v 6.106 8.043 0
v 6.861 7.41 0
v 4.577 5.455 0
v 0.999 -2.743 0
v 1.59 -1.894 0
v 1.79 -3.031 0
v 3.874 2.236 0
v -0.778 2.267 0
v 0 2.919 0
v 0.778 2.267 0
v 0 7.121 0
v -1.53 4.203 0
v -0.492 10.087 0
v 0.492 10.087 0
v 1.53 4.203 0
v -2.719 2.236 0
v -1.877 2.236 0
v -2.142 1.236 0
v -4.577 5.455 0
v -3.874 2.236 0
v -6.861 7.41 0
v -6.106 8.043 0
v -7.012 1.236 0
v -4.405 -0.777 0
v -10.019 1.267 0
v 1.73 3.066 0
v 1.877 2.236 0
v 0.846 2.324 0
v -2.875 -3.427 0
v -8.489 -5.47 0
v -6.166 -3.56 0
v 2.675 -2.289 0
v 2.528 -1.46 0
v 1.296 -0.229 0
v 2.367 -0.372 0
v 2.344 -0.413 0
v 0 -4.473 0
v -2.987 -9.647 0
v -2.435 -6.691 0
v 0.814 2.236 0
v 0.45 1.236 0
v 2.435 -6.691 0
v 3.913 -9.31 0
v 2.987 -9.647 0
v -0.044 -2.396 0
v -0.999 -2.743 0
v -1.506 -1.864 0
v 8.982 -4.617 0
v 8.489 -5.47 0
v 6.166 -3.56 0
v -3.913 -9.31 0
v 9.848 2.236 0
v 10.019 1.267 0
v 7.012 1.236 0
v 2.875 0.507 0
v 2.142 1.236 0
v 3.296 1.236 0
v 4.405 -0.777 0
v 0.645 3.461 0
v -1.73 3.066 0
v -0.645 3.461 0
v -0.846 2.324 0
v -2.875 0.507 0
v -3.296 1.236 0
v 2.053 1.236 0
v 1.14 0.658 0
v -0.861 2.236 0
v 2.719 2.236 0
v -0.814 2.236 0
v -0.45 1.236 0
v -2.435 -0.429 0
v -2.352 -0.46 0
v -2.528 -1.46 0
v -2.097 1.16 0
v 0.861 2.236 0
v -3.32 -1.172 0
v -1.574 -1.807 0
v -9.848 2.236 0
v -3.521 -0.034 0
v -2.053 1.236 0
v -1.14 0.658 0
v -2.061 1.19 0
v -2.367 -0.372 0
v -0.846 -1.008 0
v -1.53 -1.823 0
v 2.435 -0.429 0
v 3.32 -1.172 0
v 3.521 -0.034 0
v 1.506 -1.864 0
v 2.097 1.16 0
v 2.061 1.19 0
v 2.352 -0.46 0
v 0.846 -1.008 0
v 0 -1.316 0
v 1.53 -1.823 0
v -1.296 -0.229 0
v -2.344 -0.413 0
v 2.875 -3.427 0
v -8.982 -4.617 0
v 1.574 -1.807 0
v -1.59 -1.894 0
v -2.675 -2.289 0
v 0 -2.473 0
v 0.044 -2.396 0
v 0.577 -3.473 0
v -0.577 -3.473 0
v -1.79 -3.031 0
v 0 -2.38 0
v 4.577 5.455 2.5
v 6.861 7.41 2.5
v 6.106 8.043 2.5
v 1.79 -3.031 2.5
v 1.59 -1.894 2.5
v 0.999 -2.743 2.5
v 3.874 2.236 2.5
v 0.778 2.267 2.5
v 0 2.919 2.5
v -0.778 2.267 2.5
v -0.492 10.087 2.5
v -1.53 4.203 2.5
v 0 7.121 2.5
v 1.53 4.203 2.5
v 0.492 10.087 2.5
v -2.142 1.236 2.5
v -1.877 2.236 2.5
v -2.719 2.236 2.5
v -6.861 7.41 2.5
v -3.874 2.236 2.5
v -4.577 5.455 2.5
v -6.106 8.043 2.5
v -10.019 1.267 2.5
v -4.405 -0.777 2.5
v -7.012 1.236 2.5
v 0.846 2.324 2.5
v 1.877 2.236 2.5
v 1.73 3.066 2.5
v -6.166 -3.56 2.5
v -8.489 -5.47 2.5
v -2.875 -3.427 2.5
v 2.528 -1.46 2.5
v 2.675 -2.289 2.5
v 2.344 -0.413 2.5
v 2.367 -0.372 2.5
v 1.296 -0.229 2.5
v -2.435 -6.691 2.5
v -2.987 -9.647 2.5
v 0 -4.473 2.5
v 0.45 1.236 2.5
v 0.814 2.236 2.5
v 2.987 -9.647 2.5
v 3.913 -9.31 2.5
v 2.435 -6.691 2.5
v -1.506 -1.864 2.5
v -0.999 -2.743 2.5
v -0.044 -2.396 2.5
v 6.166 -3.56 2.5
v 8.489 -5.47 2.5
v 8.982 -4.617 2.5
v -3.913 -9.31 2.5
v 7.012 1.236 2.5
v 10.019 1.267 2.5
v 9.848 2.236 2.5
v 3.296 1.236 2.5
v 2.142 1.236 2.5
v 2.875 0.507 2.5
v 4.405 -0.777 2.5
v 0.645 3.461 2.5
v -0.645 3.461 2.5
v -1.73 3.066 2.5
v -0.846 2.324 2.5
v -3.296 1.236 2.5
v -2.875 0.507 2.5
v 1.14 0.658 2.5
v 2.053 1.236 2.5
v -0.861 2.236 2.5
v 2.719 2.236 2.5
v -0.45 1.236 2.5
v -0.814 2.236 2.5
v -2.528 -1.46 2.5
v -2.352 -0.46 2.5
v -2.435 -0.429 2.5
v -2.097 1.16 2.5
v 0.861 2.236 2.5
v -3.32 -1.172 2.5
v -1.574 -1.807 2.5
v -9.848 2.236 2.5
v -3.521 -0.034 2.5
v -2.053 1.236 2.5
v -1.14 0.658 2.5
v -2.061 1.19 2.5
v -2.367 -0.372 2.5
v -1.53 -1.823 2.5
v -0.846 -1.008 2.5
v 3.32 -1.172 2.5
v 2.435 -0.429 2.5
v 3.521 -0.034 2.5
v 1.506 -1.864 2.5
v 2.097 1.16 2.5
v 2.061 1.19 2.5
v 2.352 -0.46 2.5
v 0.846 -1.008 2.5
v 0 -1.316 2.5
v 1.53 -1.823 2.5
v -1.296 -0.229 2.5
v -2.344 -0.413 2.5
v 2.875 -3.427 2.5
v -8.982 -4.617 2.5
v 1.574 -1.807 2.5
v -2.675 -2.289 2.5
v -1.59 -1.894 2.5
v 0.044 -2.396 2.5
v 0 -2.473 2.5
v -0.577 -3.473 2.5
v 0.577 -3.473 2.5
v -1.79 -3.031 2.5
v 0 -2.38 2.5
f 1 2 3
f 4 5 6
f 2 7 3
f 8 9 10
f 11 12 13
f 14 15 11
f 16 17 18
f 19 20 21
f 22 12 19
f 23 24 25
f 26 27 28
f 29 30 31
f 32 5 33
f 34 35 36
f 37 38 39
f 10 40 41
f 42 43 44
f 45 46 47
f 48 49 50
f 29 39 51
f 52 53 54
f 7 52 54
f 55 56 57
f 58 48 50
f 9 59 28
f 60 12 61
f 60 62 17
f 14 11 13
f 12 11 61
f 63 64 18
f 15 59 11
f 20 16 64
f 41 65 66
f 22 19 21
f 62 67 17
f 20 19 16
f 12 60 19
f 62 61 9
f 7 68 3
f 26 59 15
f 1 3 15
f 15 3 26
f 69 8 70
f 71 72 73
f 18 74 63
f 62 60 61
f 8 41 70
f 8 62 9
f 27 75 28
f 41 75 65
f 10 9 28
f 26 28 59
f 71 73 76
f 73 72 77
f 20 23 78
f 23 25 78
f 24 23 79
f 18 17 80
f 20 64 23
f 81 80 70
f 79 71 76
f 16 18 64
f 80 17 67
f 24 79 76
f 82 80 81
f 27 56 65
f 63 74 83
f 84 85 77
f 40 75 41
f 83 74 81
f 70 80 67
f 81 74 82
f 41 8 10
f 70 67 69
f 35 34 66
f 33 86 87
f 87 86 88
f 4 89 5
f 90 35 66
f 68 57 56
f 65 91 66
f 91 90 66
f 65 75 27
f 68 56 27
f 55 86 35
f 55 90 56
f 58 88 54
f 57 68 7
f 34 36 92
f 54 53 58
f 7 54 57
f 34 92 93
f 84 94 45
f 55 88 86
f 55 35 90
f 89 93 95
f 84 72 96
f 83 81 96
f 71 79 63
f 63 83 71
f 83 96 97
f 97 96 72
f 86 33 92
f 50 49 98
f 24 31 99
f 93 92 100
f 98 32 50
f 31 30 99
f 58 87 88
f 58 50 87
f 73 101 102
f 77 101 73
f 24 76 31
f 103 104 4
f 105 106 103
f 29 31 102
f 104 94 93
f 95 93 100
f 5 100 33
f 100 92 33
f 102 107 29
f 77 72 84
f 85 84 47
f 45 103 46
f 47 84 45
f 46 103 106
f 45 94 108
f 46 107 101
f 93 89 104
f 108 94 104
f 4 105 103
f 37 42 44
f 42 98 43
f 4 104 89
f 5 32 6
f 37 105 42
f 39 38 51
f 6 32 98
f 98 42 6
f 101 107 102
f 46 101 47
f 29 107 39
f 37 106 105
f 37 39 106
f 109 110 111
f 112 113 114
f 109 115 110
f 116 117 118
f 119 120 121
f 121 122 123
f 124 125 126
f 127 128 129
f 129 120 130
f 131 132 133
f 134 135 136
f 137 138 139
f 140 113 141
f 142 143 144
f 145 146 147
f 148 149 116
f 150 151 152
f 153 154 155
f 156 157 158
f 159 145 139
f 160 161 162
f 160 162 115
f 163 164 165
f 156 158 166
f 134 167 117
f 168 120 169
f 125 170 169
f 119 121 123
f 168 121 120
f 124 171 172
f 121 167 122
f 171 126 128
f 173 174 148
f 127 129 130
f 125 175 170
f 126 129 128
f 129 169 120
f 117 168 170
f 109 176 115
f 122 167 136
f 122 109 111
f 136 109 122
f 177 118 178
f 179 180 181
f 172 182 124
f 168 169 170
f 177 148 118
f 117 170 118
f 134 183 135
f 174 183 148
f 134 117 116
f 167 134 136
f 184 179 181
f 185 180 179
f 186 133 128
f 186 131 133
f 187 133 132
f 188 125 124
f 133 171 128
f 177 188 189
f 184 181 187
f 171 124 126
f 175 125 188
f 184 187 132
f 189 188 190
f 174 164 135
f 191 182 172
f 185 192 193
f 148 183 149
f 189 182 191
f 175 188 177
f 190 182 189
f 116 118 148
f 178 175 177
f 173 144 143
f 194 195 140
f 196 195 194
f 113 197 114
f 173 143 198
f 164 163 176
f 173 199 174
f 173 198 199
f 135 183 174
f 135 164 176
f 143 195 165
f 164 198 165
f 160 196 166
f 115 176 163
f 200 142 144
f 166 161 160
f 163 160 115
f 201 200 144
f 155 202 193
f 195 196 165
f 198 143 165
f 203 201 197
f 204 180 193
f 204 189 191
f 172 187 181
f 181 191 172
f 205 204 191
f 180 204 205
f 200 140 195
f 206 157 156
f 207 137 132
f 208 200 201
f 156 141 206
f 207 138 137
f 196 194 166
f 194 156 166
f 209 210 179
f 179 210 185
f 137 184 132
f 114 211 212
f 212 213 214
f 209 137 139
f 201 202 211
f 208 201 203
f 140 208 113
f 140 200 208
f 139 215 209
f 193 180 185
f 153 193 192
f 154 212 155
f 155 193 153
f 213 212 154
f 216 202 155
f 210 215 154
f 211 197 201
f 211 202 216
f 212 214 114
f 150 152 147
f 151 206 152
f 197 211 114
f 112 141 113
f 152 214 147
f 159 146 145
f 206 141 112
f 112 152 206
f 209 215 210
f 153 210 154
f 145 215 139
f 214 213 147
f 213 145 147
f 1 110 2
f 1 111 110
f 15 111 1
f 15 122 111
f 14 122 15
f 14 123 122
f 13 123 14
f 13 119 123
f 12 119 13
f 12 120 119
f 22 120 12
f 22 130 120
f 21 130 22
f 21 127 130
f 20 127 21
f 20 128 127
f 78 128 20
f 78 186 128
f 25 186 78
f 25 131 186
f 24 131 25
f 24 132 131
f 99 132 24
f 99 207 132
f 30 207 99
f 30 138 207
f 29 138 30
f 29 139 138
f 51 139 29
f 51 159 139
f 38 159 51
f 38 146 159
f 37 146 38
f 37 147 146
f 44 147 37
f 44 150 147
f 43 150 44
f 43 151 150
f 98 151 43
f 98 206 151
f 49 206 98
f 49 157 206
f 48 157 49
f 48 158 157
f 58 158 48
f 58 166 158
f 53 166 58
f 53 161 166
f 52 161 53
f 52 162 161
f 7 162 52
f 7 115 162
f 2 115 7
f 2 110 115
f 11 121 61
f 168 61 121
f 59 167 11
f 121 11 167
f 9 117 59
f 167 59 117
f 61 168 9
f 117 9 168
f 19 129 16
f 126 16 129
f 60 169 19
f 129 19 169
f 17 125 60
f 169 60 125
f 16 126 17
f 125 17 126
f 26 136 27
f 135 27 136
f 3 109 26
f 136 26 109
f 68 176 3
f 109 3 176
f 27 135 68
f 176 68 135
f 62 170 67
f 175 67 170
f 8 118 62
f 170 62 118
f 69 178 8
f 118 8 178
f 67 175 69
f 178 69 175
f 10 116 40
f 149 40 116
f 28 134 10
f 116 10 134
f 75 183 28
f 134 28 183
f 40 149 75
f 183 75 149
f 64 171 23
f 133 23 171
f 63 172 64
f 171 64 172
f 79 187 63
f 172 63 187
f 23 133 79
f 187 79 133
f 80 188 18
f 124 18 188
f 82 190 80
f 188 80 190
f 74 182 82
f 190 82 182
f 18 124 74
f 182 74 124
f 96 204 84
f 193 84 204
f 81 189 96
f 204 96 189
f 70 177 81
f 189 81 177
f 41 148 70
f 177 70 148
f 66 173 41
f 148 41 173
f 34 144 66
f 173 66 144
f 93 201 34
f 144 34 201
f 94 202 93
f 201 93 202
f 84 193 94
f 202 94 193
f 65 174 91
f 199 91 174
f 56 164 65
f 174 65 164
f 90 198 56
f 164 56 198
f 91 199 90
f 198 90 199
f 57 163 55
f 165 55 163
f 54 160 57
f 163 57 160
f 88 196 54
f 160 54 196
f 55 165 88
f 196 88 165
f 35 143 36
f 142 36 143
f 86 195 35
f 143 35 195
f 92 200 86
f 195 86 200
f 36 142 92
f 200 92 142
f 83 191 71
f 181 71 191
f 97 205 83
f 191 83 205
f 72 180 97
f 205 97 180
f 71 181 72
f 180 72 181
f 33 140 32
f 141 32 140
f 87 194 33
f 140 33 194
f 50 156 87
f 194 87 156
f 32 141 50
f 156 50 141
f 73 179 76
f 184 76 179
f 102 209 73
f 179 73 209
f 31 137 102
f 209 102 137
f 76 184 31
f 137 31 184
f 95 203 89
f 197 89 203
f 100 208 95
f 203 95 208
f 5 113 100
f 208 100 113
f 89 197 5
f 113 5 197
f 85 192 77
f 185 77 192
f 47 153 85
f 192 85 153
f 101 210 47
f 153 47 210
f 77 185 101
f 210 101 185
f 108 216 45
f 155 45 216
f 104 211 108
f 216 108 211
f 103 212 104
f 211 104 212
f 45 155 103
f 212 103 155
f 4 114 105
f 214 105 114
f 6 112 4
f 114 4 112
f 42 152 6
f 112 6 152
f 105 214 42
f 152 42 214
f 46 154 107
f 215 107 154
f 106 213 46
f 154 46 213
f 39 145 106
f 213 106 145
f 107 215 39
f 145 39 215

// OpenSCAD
// file: lib/2dgraphing.scad
// Src: http://www.thingiverse.com/thing:11243/#files

/*************
* Examples *
*************/
// To render an example, remove the comments
pi = 3.1415926536;
e = 2.718281828;
// function to convert degrees to radians
function d2r(theta) = theta*360/(2*pi);

/* Cartesian equations */
/* Sine wave */
//pi = 3.14159;
//function _f(x) = 20*sin((1/4)*x);
//function f(x) = _f(d2r(x));
//linear_extrude(height=5)
//	2dgraph([-50, 50], 3, steps=50);

/* Parabola */
//function f(x) = pow(x, 2)/20;
//linear_extrude(height=5)
//	2dgraph([-50, 50], 3, steps=40);

/* Ellipsoid - use a cartesion equation for a half ellipse, then rotate extrude it */
//function f(x) = sqrt((2500-pow(x, 2))/3);
//rotate_extrude(convexity=10, $fn=100) 
//	rotate([0, 0, -90]) 2dgraph([-50, 50], 3, steps=100);

/* Blancmange curve (an approximation)
works best to export to dxf first, then extrude that.
the 2d render takes a long time at this resolution */
//function blancmange(x, n) = abs(round(pow(2, n)*x)-pow(2, n)*x)/pow(2, n); 
//function f(x) = blancmange(x, 0) + blancmange(x, 1) + blancmange(x, 2) + blancmange(x, 3) + blancmange(x, 4) + blancmange(x, 5) + blancmange(x, 6);
////scale([100, 100, 100]) linear_extrude(height=0.125) import_dxf("blancmange.dxf");
//2dgraph([0, 1], 0.02, steps=480);

/* Polar equations */
/* Rose curve */
//function r(theta) = cos(4*theta);
//scale([20, 20, 20]) linear_extrude(height=0.15)
//	2dgraph([0, 720], 0.1, steps=160, polar=true);

/* Archimedes spiral */
//function r(theta) = theta/2*pi;
//scale([0.02, 0.02, 0.02]) linear_extrude(height=150)
//	2dgraph([0, 360*3], 50, steps=100, polar=true);

/* Golden spiral */
//function r(theta) = pow(e, 0.0053468*theta);
//linear_extrude(height=50)
//	2dgraph([0, 7*180], 1, steps=300, polar=true);

/* Parametric equations */
/* 9-pointed star */
//function x(t) = cos(t);
//function y(t) = sin(t);
//scale([10, 10, 10]) linear_extrude(height=0.25)
//	2dgraph([10, 1450], 0.1, steps=9, parametric=true);

/* Squiggly */
//function _x(t) = sin(t)*cos(t) + sin(2*t)*cos(2*t) + sin(3*t)*cos(3*t) + sin(4*t)*cos(4*t);
//function _y(t) = sin(t)*cos(2*t) + sin(3*t)*cos(4*t) + sin(5*t)*cos(6*t) + sin(7*t)*cos(8*t);
//function x(t) = _x(d2r(t));
//function y(t) = _y(d2r(t));
//scale([20, 10, 20]) linear_extrude(height=0.15) 
//	2dgraph([0, 3*pi], 0.06, steps=400, parametric=true);

/* Butterfly curve! */
//function _x(t) = sin(t)*(pow(e, cos(t))-2*cos(4*t)-pow(sin(t/12), 5));
//function _y(t) = cos(t)*(pow(e, cos(t))-2*cos(4*t)-pow(sin(t/12), 5));
//function x(t) = _x(d2r(t));
//function y(t) = _y(d2r(t));
////scale([20, 20, 20]) linear_extrude(height=0.125) import_dxf("butterflycurve.dxf");
//2dgraph([0, 22*pi], 0.06, steps=2000, parametric=true);

/*********************
* End of examples *
*********************/

// These functions are here to help get the slope of each segment, and use that to find points for a correctly oriented polygon
function diffx(x1, y1, x2, y2, th) = cos(atan((y2-y1)/(x2-x1)) + 90)*(th/2);
function diffy(x1, y1, x2, y2, th) = sin(atan((y2-y1)/(x2-x1)) + 90)*(th/2);
function point1(x1, y1, x2, y2, th) = [x1-diffx(x1, y1, x2, y2, th), y1-diffy(x1, y1, x2, y2, th)];
function point2(x1, y1, x2, y2, th) = [x2-diffx(x1, y1, x2, y2, th), y2-diffy(x1, y1, x2, y2, th)];
function point3(x1, y1, x2, y2, th) = [x2+diffx(x1, y1, x2, y2, th), y2+diffy(x1, y1, x2, y2, th)];
function point4(x1, y1, x2, y2, th) = [x1+diffx(x1, y1, x2, y2, th), y1+diffy(x1, y1, x2, y2, th)];
function polarX(theta) = cos(theta)*r(theta);
function polarY(theta) = sin(theta)*r(theta);

module nextPolygon(x1, y1, x2, y2, x3, y3, th) {
	if((x2 > x1 && x2-diffx(x2, y2, x3, y3, th) < x2-diffx(x1, y1, x2, y2, th) || (x2 <= x1 && x2-diffx(x2, y2, x3, y3, th) > x2-diffx(x1, y1, x2, y2, th)))) {
		polygon(
			points = [
				point1(x1, y1, x2, y2, th),
				point2(x1, y1, x2, y2, th),
				// This point connects this segment to the next
				point4(x2, y2, x3, y3, th),
				point3(x1, y1, x2, y2, th),
				point4(x1, y1, x2, y2, th)
			],
			paths = [[0,1,2,3,4]]
		);
	}
	else if((x2 > x1 && x2-diffx(x2, y2, x3, y3, th) > x2-diffx(x1, y1, x2, y2, th) || (x2 <= x1 && x2-diffx(x2, y2, x3, y3, th) < x2-diffx(x1, y1, x2, y2, th)))) {
		polygon(
			points = [
				point1(x1, y1, x2, y2, th),
				point2(x1, y1, x2, y2, th),
				// This point connects this segment to the next
				point1(x2, y2, x3, y3, th),
				point3(x1, y1, x2, y2, th),
				point4(x1, y1, x2, y2, th)
			],
			paths = [[0,1,2,3,4]]
		);
	}
	else {
		polygon(
			points = [
				point1(x1, y1, x2, y2, th),
				point2(x1, y1, x2, y2, th),
				point3(x1, y1, x2, y2, th),
				point4(x1, y1, x2, y2, th)
			],
			paths = [[0,1,2,3]]
		);
	}
}

module 2dgraph(bounds=[-10,10], th=2, steps=10, polar=false, parametric=false) {
	step = (bounds[1]-bounds[0])/steps;
	union() {
		for(i = [bounds[0]:step:bounds[1]-step]) {
			if(polar) {
				nextPolygon(polarX(i), polarY(i), polarX(i+step), polarY(i+step), polarX(i+2*step), polarY(i+2*step), th);
			}
			else if(parametric) {
				nextPolygon(x(i), y(i), x(i+step), y(i+step), x(i+2*step), y(i+2*step), th);
			}
			else {
				nextPolygon(i, f(i), i+step, f(i+step), i+2*step, f(i+2*step), th);
			}
		}
	}
}
// main file
// OpenSCAD parametric graph example

// See the "Examples" section in "lib/2dgraphing.scad"

// See also: http://makerhome.blogspot.fr/2014/01/day-133-broken-heart.html
//           http://makerhome.blogspot.fr/2014/01/day-150-trefoil-torus-knots.html
//           http://makerhome.blogspot.fr/
//           http://makerhome.blogspot.fr/search?updated-max=2014-06-21T19:09:00-07:00&max-results=31&start=53&by-date=false

include <lib/2dgraphing.scad>

// Parameters
line_height = 0.25;
line_thickness = 0.1;
number_of_steps = 9;

// Define the parametric curve
function x(t) = cos(t);
function y(t) = sin(t);

// Make the graph and extrude it
scale([10, 10, 10]) linear_extrude(height = line_height)
    2dgraph([10, 1450], line_thickness, steps=number_of_steps, parametric=true);
